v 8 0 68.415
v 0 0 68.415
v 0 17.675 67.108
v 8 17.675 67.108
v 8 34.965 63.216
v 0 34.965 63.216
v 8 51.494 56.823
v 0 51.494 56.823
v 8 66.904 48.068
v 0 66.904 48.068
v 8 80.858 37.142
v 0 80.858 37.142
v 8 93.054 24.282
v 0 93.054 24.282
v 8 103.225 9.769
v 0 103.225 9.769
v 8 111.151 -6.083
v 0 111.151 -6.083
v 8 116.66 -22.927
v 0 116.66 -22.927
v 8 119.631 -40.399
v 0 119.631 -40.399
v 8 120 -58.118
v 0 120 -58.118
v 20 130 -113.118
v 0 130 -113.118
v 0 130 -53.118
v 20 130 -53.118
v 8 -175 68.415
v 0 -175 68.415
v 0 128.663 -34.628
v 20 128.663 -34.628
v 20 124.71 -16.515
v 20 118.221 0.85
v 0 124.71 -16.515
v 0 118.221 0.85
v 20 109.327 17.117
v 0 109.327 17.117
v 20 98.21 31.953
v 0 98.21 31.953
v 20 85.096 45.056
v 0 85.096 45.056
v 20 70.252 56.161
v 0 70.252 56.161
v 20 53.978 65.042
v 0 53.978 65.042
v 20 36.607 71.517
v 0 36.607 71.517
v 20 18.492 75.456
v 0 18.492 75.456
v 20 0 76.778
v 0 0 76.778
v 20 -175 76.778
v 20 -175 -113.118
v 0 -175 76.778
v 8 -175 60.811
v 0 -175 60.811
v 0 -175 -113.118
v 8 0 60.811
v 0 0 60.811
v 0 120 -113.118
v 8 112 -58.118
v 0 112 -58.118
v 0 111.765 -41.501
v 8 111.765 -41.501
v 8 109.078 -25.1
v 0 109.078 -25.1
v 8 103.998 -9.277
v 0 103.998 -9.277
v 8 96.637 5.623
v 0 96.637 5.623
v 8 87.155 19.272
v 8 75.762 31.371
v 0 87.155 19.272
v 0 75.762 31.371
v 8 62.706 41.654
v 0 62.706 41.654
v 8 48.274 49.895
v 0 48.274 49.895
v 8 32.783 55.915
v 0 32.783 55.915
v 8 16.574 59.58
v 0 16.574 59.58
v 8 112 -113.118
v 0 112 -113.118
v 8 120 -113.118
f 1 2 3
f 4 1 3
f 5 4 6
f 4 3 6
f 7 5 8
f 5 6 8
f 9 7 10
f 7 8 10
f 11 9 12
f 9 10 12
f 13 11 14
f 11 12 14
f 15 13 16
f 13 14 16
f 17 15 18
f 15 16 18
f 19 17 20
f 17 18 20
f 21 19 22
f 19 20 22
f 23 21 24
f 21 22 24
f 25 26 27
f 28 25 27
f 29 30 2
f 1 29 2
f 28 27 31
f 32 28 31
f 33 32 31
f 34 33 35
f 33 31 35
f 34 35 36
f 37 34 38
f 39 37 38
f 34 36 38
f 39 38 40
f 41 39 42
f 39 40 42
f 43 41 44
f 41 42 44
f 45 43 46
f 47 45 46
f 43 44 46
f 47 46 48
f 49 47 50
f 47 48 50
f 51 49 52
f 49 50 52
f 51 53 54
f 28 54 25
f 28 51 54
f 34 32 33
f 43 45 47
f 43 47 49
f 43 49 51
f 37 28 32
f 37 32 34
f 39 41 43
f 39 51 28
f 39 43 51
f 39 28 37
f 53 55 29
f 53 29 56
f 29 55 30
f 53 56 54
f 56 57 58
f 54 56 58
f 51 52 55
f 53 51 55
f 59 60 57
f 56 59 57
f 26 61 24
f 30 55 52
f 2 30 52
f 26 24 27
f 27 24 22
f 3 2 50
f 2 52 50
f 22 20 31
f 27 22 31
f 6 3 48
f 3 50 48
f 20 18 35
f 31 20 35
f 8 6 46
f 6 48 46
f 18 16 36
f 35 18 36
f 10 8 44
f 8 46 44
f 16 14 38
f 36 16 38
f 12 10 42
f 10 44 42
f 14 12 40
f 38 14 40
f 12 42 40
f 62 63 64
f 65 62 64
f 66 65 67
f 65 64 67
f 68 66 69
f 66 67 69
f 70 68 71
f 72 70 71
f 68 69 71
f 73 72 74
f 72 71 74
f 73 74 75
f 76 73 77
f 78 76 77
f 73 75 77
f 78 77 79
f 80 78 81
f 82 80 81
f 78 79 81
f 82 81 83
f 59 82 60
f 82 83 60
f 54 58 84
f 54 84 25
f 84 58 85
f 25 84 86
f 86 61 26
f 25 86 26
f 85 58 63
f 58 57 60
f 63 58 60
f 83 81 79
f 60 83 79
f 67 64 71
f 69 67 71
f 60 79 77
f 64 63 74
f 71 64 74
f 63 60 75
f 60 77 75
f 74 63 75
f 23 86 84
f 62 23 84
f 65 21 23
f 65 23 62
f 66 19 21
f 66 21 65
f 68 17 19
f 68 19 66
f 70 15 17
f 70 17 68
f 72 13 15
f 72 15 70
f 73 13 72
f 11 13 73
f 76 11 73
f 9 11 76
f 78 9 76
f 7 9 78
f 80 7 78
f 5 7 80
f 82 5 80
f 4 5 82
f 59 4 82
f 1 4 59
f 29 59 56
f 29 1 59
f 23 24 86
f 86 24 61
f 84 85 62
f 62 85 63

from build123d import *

# Parameters (mm, degrees)
F1_DEPTH = 20
F3_DEPTH = 8


with BuildPart() as f1:
    # F0 (on Right) → F1 (new body)
    with BuildSketch(Plane.YZ):
        with BuildLine():
            Line((0, 76.777947), (-175, 76.777947))
            Line((-175, 76.777947), (-175, -113.118447))
            Line((-175, -113.118447), (129.999959, -113.118447))
            Line((129.999959, -113.118447), (129.999959, -53.118447))
            ThreePointArc((129.999959, -53.118447), (91.887244, 38.738451), (0, 76.777947))
        make_face()
    extrude(amount=F1_DEPTH)

    # F2 (on face) → F3 (cut)
    with BuildSketch(Plane(origin=(0, 0, 0), x_dir=(0, -1, 0), z_dir=(-1, 0, 0))):
        with BuildLine():
            Line((175, 60.811221), (175, 68.414755))
            Line((175, 68.414755), (0, 68.414755))
            ThreePointArc((0, 68.414755), (-87.193236, 30.937351), (-119.999959, -58.118447))
            Line((-119.999959, -58.118447), (-119.999959, -113.118447))
            Line((-119.999959, -113.118447), (-111.999959, -113.118447))
            Line((-111.999959, -113.118447), (-111.999959, -58.118447))
            ThreePointArc((-111.999959, -58.118447), (-81.682704, 25.532649), (0, 60.811221))
            Line((0, 60.811221), (175, 60.811221))
        make_face()
    extrude(amount=-F3_DEPTH, mode=Mode.SUBTRACT)


solid = f1.part
